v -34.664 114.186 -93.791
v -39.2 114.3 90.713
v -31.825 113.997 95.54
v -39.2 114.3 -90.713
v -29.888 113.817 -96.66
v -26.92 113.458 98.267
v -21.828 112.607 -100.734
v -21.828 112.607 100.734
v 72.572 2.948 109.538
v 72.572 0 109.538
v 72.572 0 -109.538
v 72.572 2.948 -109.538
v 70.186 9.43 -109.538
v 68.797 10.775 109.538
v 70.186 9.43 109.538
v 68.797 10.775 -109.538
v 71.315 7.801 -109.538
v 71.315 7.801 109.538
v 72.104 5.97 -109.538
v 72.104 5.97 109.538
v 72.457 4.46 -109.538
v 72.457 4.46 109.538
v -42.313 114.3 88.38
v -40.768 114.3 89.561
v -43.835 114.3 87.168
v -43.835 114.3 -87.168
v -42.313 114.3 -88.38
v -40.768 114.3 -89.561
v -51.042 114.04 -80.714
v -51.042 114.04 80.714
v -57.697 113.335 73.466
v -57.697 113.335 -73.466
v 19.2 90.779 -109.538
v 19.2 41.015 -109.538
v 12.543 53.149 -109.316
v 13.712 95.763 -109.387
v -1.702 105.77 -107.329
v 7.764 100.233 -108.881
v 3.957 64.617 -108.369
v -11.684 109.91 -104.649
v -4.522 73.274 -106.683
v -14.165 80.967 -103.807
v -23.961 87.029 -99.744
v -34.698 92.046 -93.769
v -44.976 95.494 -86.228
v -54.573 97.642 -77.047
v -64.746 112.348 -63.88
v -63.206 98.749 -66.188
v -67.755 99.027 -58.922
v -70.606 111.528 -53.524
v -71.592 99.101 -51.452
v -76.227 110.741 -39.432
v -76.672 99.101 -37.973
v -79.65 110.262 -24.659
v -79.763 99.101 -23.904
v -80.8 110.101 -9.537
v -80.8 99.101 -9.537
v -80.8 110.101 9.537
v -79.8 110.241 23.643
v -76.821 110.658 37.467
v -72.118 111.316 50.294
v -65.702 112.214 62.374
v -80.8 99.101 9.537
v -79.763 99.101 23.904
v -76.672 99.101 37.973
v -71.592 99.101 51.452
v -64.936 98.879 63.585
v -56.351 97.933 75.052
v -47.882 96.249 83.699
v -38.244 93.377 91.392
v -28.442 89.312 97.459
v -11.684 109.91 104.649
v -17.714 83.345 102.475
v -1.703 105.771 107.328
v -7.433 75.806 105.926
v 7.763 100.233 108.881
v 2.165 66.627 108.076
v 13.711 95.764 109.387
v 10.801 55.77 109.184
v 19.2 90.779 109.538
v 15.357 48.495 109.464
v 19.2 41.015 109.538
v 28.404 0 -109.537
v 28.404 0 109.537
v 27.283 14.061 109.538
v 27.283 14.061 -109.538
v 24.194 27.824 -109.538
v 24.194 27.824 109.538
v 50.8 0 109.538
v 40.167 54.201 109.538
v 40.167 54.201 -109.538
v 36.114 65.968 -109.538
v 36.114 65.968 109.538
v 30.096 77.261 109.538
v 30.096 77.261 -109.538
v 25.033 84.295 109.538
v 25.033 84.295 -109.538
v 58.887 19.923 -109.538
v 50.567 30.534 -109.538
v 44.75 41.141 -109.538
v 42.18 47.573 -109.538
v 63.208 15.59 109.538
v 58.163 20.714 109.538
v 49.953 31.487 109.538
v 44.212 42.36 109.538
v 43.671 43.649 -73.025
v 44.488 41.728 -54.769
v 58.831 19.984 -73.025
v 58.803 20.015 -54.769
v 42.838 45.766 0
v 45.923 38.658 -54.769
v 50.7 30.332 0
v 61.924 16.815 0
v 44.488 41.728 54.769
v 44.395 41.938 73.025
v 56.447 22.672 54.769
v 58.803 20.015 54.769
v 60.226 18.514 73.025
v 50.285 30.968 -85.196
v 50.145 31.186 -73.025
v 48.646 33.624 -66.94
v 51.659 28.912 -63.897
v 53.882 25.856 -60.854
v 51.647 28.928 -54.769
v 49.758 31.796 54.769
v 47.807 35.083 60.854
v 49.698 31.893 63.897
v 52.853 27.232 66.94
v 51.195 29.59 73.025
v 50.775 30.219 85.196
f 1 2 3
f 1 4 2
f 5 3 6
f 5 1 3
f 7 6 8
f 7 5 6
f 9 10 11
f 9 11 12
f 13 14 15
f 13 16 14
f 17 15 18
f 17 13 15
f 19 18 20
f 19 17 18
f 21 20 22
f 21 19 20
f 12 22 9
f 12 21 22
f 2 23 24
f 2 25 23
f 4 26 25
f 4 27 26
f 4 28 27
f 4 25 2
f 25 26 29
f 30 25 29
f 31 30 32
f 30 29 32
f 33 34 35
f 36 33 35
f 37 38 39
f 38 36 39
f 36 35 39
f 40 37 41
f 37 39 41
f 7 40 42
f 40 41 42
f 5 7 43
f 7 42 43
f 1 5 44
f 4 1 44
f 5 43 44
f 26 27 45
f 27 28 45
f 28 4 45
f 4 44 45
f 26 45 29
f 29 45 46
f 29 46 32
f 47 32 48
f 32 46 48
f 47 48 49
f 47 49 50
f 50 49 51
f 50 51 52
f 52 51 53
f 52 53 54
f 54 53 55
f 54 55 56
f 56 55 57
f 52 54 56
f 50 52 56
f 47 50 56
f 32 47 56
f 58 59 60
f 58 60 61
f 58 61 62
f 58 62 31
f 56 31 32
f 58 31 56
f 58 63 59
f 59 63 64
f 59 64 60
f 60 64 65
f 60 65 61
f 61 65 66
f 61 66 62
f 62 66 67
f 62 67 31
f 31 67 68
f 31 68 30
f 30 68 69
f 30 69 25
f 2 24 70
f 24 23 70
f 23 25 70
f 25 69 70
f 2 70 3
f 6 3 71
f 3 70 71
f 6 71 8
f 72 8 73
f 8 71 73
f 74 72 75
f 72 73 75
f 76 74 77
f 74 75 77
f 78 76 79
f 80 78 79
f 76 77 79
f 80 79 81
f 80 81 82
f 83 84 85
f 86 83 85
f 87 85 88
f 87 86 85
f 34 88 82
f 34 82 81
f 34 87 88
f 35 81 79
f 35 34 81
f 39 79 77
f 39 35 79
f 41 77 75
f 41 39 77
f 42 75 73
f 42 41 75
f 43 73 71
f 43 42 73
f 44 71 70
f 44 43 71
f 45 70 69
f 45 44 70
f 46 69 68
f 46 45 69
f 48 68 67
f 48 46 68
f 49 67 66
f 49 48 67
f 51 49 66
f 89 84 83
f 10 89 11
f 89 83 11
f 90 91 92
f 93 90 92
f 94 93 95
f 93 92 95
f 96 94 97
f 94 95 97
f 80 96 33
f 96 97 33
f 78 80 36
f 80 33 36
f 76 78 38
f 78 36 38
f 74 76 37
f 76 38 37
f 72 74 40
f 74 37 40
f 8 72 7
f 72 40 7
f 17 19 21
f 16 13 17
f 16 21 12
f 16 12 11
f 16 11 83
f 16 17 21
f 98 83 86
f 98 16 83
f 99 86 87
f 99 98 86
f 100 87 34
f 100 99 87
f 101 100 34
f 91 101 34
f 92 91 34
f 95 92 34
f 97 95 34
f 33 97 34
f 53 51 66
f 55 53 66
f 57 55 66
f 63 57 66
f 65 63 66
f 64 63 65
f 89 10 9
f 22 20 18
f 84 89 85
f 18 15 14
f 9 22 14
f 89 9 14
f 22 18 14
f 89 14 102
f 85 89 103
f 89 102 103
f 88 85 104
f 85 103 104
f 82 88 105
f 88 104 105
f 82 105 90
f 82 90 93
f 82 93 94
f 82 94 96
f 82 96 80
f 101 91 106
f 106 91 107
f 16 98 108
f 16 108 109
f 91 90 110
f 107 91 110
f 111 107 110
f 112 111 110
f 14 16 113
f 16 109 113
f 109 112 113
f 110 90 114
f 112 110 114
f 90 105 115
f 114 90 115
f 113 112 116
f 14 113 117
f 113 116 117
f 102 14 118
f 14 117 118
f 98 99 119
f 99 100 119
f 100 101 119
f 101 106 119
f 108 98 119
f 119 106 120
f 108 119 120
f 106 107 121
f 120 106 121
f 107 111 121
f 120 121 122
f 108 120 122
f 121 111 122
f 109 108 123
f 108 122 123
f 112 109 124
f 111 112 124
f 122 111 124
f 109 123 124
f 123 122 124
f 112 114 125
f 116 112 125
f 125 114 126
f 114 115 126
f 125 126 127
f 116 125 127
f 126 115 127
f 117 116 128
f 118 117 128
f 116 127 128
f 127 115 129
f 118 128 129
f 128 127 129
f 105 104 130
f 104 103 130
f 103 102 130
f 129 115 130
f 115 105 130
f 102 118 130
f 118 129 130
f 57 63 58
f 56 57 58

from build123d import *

# Parameters (mm, degrees)
SKETCH1_W           = 101.6
SKETCH1_H           = 219.075
BOSS_EXTRUDE2_DEPTH = 114.3
SKETCH2_R           = 101.6
CUT_EXTRUDE1_DEPTH  = 219.075
FILLET1_R           = 90
SKETCH3_W           = 35.162695898
SKETCH3_H           = 71.534417327
BOSS_EXTRUDE3_DEPTH = 219.075
CUT_EXTRUDE2_DEPTH  = 219.3
FILLET2_R           = 80
FILLET3_R           = 10
BOSS_EXTRUDE5_DEPTH = 219.075
FILLET5_R           = 100
FILLET7_R           = 100
FILLET11_R          = 100
FILLET12_R          = 100


with BuildPart() as part:
    # Sketch1 → Boss-Extrude2 (new body)
    with BuildSketch(Plane(origin=(0, 0, 0), x_dir=(1, 0, 0), z_dir=(0, 1, 0))):
        Rectangle(SKETCH1_W, SKETCH1_H)
    extrude(amount=BOSS_EXTRUDE2_DEPTH)

    # Sketch2 → Cut-Extrude1 (cut)
    with BuildSketch(Plane.XY.offset(109.5375)):
        with Locations((-73.196036425, 0)):
            Circle(SKETCH2_R)
    extrude(amount=-CUT_EXTRUDE1_DEPTH, mode=Mode.SUBTRACT)

    # Fillet1
    fillet1_edges = [part.edges().sort_by_distance(p)[0] for p in [
        (50.8, 114.3, 0),
    ]]
    fillet(fillet1_edges, radius=FILLET1_R)

    # Sketch3 → Boss-Extrude3 (add)
    with BuildSketch(Plane.XY.offset(109.5375)):
        with Locations((54.990158277, 35.767208663)):
            Rectangle(SKETCH3_W, SKETCH3_H)
    extrude(amount=-BOSS_EXTRUDE3_DEPTH)

    # Sketch4 → Cut-Extrude2 (cut)
    with BuildSketch(Plane.XY.offset(109.5375)):
        with BuildLine():
            Line((37.408810328, 71.534417327), (72.571506226, 71.534417327))
            Line((72.571506226, 71.534417327), (72.571506226, 7.917200167))
            add(Edge.make_bspline(
                [(37.408810328, 71.534417327), (40.159862315, 31.272718553), (72.571506226, 7.917200167)],
                knots=[0, 0, 0, 1, 1, 1], degree=2))
        make_face()
    extrude(amount=-CUT_EXTRUDE2_DEPTH, mode=Mode.SUBTRACT)

    # Fillet2
    fillet2_edges = [part.edges().sort_by_distance(p)[0] for p in [
        (37.408810328, 71.534417327, 0),
    ]]
    fillet(fillet2_edges, radius=FILLET2_R)

    # Fillet3
    fillet3_edges = [part.edges().sort_by_distance(p)[0] for p in [
        (72.571506226, 7.917200167, 0),
    ]]
    fillet(fillet3_edges, radius=FILLET3_R)

    # Sketch5 → Boss-Extrude5 (add)
    with BuildSketch(Plane.XY.offset(109.5375)):
        Polygon((-80.8, 99.100845367), (-80.8, 110.100845367), (-50.8, 114.3), (-50.8, 99.100845367), align=None)
    extrude(amount=-BOSS_EXTRUDE5_DEPTH)

    # Fillet5
    # the kernel refuses this fillet: 100 mm, written as the material it adds along each edge
    with BuildSketch(Plane(origin=(-50.8, 99.100845367, -109.5375), x_dir=(0.6243262651126902, -0.7811636926345457, 0), z_dir=(0, 0, 1))) as fillet5_piece_1:
        with BuildLine():
            CenterArc((65.135381338, -78.674577281), FILLET5_R, 51.882430425, 89.484815402)
            Line((-12.980987926, -16.24195077), (-14.543315311, -14.99329824))
            Line((-14.543315311, -14.99329824), (-1.562327385, 1.24865253))
            Line((-1.562327385, 1.24865253), (-1.24865253, 1.562327385))
            ThreePointArc((-1.24865253, 1.562327385), (63.431548535, 24.233768828), (128.097651386, 1.573491546))
            Line((128.097651386, 1.573491546), (126.863097071, 0))
        make_face()
    extrude(amount=219.075)

    # Fillet7
    fillet7_edges = [part.edges().sort_by_distance(p)[0] for p in [
        (-50.8, 114.3, 0),
    ]]
    fillet(fillet7_edges, radius=FILLET7_R)

    # Fillet11
    # the kernel refuses this fillet: 100 mm, written as the material it takes off along each edge
    with BuildSketch(Plane(origin=(-80.8, -150.899154633, -109.5375), x_dir=(1, 0, 0), z_dir=(0, 1, 0))) as fillet11_piece_1:
        with BuildLine():
            CenterArc((FILLET11_R, -FILLET11_R), FILLET11_R, 90, 90)
            Line((0, -FILLET11_R), (0, 0))
            Line((0, 0), (FILLET11_R, 0))
        make_face()
    extrude(amount=511, mode=Mode.SUBTRACT)

    # Fillet12
    # the kernel refuses this fillet: 100 mm, written as the material it takes off along each edge
    with BuildSketch(Plane(origin=(-80.8, -150.899154633, 109.5375), x_dir=(1, 0, 0), z_dir=(0, 1, 0))) as fillet12_piece_1:
        with BuildLine():
            CenterArc((FILLET12_R, FILLET12_R), FILLET12_R, 180, 90)
            Line((0, FILLET12_R), (0, 0))
            Line((0, 0), (FILLET12_R, 0))
        make_face()
    extrude(amount=511, mode=Mode.SUBTRACT)


solid = part.part
